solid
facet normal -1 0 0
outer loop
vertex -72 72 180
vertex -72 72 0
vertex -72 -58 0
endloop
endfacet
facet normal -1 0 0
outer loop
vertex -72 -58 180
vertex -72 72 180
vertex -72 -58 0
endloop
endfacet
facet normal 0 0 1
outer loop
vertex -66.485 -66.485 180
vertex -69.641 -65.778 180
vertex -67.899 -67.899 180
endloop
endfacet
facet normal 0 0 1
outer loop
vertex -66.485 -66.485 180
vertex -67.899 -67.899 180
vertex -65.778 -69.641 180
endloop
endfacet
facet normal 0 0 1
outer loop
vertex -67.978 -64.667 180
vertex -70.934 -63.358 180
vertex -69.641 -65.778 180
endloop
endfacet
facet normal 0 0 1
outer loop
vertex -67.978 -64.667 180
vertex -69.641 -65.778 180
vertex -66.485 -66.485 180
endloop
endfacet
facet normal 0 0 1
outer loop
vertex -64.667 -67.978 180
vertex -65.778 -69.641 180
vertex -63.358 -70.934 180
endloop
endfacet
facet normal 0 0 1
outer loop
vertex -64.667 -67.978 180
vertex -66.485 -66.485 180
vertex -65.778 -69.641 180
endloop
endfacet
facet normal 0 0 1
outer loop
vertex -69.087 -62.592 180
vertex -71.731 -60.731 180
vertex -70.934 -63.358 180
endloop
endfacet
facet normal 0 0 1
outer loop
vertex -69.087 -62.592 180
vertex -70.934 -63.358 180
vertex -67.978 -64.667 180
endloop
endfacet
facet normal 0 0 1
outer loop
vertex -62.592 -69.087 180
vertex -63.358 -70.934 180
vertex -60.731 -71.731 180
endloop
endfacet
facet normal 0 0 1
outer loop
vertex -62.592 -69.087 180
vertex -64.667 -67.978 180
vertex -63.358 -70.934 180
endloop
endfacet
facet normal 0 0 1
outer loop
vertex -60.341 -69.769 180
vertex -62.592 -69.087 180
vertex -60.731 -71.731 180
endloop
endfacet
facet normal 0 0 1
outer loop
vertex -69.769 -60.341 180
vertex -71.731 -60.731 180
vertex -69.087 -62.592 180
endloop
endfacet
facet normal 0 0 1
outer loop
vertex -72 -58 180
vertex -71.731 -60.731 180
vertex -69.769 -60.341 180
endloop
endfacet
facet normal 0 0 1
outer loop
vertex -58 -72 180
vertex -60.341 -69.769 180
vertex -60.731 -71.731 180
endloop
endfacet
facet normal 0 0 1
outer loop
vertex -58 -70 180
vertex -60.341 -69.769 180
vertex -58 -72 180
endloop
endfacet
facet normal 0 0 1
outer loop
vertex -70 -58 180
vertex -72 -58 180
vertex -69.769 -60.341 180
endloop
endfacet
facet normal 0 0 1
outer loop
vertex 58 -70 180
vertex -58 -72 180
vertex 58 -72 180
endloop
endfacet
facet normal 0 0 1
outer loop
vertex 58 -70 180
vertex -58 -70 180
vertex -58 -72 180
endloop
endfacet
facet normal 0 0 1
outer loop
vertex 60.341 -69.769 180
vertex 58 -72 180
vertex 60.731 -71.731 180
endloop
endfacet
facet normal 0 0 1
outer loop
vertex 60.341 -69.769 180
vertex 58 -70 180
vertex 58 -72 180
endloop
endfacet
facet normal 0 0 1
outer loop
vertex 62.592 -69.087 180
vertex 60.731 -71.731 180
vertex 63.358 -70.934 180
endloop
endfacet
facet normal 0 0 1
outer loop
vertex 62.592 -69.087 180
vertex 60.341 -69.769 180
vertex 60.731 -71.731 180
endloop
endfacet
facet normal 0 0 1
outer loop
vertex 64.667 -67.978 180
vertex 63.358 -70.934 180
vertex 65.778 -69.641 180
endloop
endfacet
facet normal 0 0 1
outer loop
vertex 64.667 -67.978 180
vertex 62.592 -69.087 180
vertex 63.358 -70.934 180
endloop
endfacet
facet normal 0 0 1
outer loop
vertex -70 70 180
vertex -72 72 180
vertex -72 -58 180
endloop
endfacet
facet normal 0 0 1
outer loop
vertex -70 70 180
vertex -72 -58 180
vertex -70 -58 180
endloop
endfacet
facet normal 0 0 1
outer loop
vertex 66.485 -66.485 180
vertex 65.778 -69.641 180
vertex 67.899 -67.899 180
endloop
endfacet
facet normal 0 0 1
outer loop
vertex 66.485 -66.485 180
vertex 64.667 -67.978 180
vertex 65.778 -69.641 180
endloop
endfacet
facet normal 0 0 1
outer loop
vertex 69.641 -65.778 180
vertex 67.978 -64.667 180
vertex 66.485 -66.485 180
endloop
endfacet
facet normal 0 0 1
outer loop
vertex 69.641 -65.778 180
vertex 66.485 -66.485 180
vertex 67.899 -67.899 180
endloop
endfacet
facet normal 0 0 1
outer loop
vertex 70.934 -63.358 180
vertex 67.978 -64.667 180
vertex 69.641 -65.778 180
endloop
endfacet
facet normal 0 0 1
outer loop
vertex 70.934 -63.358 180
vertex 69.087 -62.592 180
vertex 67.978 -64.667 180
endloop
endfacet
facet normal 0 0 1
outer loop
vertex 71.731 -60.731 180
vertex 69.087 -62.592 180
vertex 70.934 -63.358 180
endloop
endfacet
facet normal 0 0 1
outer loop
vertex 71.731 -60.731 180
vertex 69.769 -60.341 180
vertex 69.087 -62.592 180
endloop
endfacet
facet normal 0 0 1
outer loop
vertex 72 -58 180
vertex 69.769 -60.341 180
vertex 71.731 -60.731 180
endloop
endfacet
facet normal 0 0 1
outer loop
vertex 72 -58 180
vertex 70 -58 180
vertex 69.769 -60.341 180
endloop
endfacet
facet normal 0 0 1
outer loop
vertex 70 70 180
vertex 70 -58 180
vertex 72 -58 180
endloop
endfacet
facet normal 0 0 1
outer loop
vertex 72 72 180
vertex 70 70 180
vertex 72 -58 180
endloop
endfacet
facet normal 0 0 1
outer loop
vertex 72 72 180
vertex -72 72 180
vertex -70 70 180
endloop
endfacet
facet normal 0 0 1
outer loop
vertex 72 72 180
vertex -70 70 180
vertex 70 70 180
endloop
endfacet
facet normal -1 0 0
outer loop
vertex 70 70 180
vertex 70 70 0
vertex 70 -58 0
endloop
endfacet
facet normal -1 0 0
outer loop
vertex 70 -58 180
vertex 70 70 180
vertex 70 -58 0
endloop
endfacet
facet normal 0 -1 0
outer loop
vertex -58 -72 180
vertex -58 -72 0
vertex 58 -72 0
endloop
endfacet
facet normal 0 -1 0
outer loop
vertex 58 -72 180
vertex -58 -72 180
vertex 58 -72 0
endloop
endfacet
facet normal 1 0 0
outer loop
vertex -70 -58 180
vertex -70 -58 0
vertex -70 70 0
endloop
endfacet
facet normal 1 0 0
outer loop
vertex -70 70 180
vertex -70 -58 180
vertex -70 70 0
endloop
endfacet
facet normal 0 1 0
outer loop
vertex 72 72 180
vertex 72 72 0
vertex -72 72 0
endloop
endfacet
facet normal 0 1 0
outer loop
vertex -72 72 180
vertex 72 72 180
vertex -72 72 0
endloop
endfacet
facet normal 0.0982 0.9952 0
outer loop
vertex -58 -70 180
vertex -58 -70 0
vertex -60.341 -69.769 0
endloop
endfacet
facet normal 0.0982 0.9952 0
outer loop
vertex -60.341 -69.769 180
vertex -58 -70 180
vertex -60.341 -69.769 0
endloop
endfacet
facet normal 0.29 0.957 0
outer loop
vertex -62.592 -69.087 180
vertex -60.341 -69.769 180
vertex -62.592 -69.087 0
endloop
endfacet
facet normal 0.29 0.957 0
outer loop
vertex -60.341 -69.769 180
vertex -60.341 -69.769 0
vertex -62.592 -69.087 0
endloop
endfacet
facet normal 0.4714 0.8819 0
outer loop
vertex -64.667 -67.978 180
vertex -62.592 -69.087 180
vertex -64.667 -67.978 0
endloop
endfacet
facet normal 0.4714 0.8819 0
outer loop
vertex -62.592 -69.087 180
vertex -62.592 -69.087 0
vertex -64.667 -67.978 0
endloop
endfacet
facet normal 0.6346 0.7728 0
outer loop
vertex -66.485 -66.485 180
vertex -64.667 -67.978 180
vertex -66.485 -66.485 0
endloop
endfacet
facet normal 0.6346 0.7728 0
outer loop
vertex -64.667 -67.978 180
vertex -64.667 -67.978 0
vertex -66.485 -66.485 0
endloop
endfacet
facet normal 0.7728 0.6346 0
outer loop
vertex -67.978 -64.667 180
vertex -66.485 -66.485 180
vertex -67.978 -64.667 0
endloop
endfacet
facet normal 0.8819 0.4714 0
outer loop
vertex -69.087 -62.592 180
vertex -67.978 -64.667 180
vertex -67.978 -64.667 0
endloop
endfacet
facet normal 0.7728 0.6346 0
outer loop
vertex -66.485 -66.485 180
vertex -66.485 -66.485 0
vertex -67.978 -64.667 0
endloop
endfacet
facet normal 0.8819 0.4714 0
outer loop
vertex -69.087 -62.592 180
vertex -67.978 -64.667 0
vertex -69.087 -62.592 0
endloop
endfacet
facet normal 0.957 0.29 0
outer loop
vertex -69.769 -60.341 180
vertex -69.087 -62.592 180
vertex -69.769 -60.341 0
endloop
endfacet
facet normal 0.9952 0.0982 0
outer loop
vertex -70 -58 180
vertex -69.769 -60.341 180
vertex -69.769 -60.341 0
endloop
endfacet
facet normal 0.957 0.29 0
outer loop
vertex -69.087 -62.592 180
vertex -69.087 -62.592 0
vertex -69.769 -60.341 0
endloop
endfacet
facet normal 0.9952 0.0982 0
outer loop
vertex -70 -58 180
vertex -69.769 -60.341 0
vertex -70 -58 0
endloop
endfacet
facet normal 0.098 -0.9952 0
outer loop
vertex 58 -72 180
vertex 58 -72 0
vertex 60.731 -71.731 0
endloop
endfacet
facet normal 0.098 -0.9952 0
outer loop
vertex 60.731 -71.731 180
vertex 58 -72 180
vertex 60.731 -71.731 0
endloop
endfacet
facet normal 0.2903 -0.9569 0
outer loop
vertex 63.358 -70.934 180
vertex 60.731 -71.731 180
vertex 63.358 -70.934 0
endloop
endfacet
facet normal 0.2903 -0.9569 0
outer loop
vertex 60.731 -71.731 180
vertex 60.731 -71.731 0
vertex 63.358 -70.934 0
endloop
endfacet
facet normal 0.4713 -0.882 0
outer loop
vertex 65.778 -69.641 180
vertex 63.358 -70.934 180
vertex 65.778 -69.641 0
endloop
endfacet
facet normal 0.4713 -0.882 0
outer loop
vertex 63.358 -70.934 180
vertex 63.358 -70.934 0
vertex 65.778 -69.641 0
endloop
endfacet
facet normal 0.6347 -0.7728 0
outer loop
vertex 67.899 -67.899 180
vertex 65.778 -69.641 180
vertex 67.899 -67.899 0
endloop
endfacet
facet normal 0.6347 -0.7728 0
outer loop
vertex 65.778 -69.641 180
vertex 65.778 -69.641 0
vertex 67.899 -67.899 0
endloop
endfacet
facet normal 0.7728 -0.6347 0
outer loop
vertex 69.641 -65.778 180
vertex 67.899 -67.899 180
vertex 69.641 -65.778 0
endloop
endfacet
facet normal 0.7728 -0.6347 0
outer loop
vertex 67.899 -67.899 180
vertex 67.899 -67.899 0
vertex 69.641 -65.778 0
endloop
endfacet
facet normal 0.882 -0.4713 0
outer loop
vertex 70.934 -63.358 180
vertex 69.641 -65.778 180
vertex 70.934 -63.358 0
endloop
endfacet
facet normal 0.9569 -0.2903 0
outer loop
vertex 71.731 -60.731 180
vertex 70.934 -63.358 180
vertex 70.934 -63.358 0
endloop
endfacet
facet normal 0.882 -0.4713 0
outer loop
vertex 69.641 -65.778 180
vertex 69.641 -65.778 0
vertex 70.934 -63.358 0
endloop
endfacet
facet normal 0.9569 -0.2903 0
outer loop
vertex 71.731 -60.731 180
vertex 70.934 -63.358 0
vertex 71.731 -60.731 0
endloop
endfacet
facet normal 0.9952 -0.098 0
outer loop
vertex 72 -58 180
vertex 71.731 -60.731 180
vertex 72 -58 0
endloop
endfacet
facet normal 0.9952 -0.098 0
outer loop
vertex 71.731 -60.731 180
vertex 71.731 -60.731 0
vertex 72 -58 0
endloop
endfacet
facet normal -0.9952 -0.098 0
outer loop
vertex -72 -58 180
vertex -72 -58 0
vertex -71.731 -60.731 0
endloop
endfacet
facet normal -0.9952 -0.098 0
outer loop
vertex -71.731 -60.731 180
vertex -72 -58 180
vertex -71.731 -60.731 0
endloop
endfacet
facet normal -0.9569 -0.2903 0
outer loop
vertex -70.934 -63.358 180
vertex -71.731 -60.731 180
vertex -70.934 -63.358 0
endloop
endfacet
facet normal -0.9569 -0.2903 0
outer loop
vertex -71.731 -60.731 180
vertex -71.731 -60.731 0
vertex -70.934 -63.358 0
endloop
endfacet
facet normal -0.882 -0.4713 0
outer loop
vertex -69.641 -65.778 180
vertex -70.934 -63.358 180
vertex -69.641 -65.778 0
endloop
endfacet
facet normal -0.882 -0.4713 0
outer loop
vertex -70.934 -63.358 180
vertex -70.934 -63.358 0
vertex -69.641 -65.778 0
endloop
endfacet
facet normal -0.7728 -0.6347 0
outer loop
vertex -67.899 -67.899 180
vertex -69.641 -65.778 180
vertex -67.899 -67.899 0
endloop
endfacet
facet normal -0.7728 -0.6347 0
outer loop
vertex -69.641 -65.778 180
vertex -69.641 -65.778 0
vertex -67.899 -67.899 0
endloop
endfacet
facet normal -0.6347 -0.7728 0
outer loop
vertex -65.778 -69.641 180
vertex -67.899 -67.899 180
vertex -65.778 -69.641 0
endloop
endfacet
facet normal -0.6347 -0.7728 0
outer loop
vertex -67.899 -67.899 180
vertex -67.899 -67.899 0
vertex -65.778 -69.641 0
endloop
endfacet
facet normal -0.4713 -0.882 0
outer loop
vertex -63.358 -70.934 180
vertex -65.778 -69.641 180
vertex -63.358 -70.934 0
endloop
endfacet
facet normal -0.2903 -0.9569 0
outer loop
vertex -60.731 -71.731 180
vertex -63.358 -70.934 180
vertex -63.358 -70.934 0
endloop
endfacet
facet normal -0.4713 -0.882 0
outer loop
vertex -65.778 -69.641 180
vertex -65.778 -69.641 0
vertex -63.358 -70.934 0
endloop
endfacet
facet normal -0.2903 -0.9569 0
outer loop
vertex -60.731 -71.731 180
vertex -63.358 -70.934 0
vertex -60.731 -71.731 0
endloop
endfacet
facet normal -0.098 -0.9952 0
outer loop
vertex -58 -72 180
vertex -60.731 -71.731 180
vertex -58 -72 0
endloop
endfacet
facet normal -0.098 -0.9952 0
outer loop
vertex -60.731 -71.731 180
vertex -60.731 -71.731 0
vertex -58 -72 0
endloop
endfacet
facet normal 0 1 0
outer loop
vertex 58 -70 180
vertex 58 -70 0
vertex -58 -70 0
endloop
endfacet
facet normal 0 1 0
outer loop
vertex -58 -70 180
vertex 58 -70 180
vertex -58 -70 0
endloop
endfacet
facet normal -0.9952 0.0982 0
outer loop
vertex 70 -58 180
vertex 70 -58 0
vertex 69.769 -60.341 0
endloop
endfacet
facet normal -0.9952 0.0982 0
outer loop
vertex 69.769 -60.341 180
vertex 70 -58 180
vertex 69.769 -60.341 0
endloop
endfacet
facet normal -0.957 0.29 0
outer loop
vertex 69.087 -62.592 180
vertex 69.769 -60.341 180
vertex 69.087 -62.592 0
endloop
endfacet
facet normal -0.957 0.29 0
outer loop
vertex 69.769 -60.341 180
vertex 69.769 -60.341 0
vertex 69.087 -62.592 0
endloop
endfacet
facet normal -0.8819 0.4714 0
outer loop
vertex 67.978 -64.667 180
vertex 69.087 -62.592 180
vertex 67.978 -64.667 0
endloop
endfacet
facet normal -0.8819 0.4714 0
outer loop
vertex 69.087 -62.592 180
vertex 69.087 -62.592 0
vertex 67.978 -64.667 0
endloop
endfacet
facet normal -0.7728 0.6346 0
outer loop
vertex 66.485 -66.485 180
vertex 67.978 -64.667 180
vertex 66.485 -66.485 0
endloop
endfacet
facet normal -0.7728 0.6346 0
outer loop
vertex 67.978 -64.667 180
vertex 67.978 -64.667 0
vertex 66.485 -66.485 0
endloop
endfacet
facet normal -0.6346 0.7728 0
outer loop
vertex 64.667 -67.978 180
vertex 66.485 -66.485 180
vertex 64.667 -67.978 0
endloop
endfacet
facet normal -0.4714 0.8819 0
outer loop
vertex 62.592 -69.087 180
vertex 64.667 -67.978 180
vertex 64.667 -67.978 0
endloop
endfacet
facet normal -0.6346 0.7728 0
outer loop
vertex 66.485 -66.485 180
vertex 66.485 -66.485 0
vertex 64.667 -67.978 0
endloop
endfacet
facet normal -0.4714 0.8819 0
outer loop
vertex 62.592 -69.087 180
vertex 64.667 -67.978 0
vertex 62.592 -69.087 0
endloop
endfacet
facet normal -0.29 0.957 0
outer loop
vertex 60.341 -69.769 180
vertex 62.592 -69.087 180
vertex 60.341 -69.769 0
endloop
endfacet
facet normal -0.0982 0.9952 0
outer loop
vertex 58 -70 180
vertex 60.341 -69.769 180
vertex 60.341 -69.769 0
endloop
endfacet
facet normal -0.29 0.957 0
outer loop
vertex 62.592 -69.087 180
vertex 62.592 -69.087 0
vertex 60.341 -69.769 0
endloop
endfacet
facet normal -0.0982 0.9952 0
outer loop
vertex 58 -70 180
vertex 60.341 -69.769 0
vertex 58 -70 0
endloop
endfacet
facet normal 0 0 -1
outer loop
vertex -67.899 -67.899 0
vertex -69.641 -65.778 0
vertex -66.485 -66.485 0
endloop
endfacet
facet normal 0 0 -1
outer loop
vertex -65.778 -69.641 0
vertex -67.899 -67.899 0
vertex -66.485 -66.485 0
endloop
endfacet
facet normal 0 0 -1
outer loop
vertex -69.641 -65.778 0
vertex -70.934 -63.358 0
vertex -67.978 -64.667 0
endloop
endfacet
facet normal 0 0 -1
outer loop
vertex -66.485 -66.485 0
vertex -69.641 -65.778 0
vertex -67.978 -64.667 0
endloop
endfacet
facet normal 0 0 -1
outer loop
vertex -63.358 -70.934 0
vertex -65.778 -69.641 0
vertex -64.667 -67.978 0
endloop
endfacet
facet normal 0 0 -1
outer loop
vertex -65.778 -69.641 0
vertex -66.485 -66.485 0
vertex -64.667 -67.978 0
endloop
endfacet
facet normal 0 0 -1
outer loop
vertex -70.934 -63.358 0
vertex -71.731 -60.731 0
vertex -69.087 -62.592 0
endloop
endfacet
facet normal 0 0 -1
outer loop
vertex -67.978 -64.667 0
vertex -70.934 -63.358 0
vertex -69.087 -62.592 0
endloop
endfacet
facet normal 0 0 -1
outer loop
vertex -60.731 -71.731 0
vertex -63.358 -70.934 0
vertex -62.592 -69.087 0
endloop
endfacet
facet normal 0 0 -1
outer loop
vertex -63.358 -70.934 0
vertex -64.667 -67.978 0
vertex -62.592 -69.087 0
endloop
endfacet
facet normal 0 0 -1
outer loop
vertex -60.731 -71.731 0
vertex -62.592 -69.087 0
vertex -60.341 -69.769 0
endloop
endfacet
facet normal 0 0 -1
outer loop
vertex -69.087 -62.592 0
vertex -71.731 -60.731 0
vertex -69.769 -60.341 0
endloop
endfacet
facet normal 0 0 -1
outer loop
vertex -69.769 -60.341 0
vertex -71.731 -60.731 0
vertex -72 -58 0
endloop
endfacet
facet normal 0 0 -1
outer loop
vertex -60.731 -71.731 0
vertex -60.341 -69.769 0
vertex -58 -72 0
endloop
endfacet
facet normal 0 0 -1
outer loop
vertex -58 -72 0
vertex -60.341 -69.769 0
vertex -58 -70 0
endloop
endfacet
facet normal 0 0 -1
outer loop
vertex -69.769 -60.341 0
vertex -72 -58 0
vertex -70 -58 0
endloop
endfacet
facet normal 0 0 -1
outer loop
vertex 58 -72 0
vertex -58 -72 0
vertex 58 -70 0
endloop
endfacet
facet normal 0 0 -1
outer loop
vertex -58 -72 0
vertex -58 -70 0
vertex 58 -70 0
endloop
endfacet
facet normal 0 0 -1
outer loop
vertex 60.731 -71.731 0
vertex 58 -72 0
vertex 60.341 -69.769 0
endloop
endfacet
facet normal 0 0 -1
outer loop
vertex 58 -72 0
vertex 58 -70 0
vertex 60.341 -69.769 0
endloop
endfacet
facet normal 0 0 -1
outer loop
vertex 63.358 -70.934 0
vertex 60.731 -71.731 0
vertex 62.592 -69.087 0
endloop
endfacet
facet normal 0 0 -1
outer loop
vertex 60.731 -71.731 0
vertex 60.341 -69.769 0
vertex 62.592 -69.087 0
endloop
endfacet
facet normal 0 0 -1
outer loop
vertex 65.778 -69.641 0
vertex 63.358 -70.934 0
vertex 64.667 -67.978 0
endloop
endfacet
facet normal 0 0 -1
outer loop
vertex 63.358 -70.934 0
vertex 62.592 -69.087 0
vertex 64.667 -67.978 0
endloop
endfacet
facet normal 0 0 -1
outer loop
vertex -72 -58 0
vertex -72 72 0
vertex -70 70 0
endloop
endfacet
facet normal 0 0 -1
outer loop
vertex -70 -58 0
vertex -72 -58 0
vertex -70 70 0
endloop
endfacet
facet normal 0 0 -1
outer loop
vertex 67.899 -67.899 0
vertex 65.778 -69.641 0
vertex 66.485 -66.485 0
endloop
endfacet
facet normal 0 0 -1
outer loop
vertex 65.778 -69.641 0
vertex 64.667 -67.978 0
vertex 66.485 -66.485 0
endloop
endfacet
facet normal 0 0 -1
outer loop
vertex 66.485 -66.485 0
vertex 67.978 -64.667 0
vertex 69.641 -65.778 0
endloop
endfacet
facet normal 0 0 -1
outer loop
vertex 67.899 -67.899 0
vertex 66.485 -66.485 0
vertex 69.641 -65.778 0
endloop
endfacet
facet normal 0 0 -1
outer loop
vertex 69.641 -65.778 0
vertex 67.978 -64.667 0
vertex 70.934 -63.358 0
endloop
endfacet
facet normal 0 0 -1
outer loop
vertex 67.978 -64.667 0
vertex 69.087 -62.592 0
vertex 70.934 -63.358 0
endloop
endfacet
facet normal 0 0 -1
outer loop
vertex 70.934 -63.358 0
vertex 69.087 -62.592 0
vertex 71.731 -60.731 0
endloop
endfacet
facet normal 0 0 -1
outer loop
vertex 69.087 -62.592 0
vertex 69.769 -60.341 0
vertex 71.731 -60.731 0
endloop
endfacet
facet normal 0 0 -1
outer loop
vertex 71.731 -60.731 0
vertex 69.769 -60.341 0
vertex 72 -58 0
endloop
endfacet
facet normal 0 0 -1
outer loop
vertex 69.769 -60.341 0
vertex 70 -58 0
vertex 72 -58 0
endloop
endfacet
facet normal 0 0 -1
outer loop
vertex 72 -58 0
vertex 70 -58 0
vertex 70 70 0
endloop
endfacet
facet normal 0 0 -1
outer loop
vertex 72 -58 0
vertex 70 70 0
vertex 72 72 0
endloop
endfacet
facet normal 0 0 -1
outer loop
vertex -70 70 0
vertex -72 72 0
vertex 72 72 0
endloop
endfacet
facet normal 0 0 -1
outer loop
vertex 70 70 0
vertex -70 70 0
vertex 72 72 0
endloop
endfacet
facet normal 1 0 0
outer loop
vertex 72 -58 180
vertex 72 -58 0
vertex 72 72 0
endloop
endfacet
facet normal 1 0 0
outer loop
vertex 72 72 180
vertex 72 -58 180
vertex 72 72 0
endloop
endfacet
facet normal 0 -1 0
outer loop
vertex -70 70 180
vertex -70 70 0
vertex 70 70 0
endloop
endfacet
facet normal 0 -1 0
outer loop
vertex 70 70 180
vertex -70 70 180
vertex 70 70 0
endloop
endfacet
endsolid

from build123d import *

# Parameters (mm, degrees)
BOSS_EXTRUDE1_DEPTH = 180


with BuildPart() as part:
    # Sketch1 → Boss-Extrude1 (new body)
    with BuildSketch(Plane.XY):
        with BuildLine():
            Line((-58, -72), (58, -72))
            ThreePointArc((58, -72), (67.899494937, -67.899494937), (72, -58))
            Line((72, -58), (72, 72))
            Line((72, 72), (-72, 72))
            Line((-72, 72), (-72, -58))
            ThreePointArc((-72, -58), (-67.899494937, -67.899494937), (-58, -72))
        make_face()
        with BuildLine():
            Line((-70, -58), (-70, 70))
            Line((-70, 70), (70, 70))
            Line((70, 70), (70, -58))
            ThreePointArc((70, -58), (66.485281374, -66.485281374), (58, -70))
            Line((58, -70), (-58, -70))
            ThreePointArc((-58, -70), (-66.485281374, -66.485281374), (-70, -58))
        make_face(mode=Mode.SUBTRACT)
    extrude(amount=BOSS_EXTRUDE1_DEPTH)


solid = part.part
